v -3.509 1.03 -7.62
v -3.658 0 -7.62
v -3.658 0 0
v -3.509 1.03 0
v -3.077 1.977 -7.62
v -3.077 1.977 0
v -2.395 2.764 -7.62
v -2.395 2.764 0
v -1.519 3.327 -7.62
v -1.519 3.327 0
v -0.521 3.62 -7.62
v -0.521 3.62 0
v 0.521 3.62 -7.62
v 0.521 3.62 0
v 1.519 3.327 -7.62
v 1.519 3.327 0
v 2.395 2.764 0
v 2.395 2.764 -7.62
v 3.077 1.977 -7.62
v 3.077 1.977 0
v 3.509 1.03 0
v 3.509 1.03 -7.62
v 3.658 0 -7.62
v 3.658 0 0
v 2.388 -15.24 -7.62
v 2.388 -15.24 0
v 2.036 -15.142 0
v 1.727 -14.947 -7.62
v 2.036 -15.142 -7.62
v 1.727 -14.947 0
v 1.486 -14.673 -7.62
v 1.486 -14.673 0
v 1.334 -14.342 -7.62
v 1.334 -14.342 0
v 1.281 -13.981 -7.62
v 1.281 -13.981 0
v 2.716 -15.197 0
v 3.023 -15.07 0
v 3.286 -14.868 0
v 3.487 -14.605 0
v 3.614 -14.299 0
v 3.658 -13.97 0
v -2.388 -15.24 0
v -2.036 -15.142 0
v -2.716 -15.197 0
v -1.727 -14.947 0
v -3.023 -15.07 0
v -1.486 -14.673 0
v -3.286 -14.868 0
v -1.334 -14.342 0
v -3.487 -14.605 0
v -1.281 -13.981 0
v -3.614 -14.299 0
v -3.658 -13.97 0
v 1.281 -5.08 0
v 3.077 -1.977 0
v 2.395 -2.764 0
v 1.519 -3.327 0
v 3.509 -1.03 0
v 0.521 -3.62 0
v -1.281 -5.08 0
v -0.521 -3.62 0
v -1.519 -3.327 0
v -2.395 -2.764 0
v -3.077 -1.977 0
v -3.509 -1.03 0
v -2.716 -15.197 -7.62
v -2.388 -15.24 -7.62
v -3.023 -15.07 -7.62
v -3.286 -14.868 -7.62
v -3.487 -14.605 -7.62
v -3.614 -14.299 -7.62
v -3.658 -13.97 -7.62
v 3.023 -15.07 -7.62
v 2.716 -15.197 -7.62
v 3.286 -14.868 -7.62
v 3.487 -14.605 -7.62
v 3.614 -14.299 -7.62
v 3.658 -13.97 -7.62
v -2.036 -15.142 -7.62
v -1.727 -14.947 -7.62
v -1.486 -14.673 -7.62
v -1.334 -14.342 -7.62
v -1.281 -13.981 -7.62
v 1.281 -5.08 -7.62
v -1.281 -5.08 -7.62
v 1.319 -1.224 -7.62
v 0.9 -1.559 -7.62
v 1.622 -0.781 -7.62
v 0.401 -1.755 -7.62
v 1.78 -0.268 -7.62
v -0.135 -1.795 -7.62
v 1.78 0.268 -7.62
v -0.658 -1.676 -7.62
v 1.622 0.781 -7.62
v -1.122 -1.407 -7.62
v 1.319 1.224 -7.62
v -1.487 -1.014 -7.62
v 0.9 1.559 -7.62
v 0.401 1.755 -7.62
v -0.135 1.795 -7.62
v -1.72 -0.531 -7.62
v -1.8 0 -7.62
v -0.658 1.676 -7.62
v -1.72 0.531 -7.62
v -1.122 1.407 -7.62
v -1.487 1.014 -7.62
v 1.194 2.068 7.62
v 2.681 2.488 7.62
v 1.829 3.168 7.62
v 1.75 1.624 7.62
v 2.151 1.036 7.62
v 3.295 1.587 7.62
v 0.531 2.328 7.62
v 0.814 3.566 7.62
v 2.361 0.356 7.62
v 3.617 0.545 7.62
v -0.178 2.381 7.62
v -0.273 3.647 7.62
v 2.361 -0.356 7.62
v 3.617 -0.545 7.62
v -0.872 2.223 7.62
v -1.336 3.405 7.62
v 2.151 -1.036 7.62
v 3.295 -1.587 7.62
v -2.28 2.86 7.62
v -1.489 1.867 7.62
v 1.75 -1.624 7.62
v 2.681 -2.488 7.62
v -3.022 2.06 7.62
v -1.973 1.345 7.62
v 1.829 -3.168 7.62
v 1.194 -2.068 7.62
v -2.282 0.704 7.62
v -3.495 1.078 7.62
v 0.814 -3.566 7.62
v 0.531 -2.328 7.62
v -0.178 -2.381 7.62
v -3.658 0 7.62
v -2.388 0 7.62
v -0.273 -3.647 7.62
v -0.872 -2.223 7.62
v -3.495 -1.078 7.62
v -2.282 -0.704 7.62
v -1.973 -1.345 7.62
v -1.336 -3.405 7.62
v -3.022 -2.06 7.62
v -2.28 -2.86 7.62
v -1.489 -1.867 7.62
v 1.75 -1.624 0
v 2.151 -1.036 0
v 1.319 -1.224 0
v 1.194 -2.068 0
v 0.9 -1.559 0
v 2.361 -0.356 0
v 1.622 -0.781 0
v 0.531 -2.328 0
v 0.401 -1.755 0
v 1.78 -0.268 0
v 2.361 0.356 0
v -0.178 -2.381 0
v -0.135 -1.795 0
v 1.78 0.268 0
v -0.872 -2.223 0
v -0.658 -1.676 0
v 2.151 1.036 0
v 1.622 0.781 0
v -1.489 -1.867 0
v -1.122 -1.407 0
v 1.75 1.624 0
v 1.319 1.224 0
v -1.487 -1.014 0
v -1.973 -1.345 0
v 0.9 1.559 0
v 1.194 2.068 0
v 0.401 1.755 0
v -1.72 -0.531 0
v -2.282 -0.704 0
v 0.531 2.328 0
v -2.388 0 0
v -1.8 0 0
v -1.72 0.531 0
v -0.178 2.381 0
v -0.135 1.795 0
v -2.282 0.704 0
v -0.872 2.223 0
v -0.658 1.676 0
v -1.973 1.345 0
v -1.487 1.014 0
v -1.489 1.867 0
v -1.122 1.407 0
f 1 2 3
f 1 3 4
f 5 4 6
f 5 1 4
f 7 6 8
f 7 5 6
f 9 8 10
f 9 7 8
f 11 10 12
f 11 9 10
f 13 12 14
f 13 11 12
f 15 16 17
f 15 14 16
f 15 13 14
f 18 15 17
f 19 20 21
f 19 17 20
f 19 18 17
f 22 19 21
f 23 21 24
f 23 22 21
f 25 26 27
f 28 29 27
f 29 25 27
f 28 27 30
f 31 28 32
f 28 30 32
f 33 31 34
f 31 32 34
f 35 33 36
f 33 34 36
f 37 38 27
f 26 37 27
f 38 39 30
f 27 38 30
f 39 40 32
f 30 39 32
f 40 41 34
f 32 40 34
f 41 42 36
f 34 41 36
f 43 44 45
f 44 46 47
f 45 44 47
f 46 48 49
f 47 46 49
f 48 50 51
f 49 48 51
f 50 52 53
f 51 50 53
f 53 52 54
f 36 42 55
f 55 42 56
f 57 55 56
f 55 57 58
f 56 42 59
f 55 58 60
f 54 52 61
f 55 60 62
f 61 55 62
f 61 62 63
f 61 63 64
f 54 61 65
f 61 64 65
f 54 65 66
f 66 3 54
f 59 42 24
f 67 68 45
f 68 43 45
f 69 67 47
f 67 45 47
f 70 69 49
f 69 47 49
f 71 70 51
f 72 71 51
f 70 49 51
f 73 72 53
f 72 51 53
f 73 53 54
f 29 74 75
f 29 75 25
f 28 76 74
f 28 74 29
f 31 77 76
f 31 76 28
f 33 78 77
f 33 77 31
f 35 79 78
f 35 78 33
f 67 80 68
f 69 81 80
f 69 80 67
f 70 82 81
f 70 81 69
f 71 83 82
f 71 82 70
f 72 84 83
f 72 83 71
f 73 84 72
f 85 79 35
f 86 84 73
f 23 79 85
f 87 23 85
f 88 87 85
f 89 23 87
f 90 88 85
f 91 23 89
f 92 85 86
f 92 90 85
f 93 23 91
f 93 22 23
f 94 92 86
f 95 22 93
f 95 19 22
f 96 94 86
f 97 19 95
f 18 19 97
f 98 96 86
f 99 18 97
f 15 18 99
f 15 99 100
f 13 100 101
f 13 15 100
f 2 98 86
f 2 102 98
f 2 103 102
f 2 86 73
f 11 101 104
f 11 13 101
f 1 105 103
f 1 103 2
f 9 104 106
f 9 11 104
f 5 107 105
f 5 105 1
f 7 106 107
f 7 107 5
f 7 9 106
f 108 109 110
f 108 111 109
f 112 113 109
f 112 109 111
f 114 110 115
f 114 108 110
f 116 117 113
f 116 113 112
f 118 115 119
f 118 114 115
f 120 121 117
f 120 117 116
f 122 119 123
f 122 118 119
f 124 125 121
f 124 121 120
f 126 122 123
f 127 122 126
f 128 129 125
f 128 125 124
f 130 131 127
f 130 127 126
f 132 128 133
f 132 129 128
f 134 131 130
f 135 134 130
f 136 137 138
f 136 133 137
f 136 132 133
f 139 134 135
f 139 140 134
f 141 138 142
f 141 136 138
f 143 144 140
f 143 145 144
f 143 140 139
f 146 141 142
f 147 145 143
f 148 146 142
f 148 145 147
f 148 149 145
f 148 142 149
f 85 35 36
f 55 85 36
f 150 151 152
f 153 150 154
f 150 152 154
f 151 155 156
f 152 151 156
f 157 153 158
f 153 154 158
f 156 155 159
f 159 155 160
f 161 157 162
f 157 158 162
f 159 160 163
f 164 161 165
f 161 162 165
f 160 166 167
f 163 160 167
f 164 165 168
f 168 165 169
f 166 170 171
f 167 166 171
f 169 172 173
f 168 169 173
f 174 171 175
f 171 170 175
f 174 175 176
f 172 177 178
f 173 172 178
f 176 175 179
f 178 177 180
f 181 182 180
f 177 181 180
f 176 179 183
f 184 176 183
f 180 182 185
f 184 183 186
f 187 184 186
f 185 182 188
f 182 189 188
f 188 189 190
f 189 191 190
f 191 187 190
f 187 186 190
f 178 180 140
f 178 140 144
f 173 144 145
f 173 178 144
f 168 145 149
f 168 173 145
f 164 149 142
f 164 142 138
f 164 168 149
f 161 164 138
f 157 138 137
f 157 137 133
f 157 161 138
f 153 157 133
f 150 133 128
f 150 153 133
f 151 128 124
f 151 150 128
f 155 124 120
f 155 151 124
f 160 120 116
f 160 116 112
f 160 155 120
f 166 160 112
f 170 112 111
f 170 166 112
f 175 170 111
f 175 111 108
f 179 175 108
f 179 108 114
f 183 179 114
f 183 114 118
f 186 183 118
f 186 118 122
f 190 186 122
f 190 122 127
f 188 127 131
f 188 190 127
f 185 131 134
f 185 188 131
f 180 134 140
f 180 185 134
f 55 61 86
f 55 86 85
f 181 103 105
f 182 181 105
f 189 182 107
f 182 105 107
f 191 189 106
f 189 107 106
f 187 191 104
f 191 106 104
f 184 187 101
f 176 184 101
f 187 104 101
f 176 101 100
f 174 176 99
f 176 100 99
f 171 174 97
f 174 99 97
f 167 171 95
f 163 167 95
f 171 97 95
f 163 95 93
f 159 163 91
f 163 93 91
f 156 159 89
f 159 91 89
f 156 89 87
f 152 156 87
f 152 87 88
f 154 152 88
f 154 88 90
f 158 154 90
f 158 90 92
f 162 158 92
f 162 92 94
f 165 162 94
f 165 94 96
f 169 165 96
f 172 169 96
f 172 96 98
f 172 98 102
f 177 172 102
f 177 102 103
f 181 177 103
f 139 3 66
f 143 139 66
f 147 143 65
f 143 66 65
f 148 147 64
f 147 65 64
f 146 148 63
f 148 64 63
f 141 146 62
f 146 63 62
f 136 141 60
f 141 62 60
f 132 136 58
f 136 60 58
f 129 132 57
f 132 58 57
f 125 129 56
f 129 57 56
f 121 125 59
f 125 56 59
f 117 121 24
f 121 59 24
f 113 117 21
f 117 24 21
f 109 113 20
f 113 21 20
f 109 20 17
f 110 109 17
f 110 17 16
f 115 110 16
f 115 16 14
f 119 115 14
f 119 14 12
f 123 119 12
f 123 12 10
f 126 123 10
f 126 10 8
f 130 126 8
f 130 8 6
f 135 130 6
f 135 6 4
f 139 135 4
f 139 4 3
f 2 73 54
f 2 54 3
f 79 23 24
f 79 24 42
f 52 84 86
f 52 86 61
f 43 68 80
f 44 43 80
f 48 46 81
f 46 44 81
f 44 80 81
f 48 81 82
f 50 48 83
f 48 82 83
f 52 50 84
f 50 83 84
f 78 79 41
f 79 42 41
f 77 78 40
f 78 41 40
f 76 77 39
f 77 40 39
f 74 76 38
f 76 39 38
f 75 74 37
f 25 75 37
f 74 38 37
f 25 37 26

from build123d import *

# Parameters (mm, degrees)
SKETCH1_R            = 3.6576
SKETCH1_R_2          = 2.3876
BOSS_EXTRUDE1_DEPTH  = 7.62
BOSS_EXTRUDE2_START  = 7.62
BOSS_EXTRUDE2_DEPTH  = 7.62
FILLET1_R            = 1.27
SKETCH5_W            = 2.5622
SKETCH5_H            = 7.62
CUT_EXTRUDE1_DEPTH   = 10.16
FILLET2_R            = 1.27
M3_CLEARANCE_HOLE1_D = 3.6


with BuildPart() as part:
    # Sketch1 → Boss-Extrude1 (new body)
    with BuildSketch(Plane.XY):
        with Locations(Location((0, 0, 0), (0, 0, 180))):
            Circle(SKETCH1_R)
        with Locations(Location((0, 0, 0), (0, 0, 180))):
            Circle(SKETCH1_R_2, mode=Mode.SUBTRACT)
    extrude(amount=BOSS_EXTRUDE1_DEPTH)

    # Sketch4 → Boss-Extrude2 (add)
    with BuildSketch(Plane(origin=(0, 0, 0), x_dir=(-1, 0, 0), z_dir=(0, 0, -1)).offset(BOSS_EXTRUDE2_START)):
        with BuildLine():
            Line((-3.6576, 0), (-3.6576, -15.24))
            Line((-3.6576, -15.24), (3.6576, -15.24))
            Line((3.6576, -15.24), (3.6576, 0))
            ThreePointArc((3.6576, 0), (0, 3.6576), (-3.6576, 0))
        make_face()
    extrude(amount=-BOSS_EXTRUDE2_DEPTH)

    # Fillet1
    fillet1_edges = [part.edges().sort_by_distance(p)[0] for p in [
        (3.6576, -15.24, -3.81),
        (-3.6576, -15.24, -3.81),
    ]]
    fillet(fillet1_edges, radius=FILLET1_R)

    # Sketch5 → Cut-Extrude1 (cut)
    with BuildSketch(Plane.XZ.offset(15.24)):
        with Locations((0, -3.81)):
            Rectangle(SKETCH5_W, SKETCH5_H)
    extrude(amount=-CUT_EXTRUDE1_DEPTH, mode=Mode.SUBTRACT)

    # Fillet2
    # the kernel refuses this fillet: 1.27 mm, written as the material it takes off along each edge
    with BuildSketch(Plane(origin=(1.2811, -15.24, 3.148578796), x_dir=(0, 1, 0), z_dir=(0, 0, -1))) as fillet2_piece_1:
        with BuildLine():
            CenterArc((1.259431519, 1.27), FILLET2_R, 187.396796907, 82.603203093)
            Line((0, 1.1065), (-0.02518863, 1.10323))
            ThreePointArc((-0.02518863, 1.10323), (-0.0254, 0.55325), (-0.0254, 0))
            Line((-0.0254, 0), (0, -0.0254))
            Line((0, -0.0254), (1.259431519, -0.0254))
            Line((1.259431519, -0.0254), (1.259431519, 0))
        make_face()
    extrude(amount=13.917157593, mode=Mode.SUBTRACT)
    with BuildSketch(Plane(origin=(-1.2811, -15.24, -10.768578796), x_dir=(-1, 0, 0), z_dir=(0, 0, 1))) as fillet2_piece_2:
        with BuildLine():
            CenterArc((1.27, -1.259431519), FILLET2_R, 97.396796907, 82.603203093)
            Line((0, -1.259431519), (-0.0254, -1.259431519))
            Line((-0.0254, -1.259431519), (-0.0254, 0))
            Line((-0.0254, 0), (0, 0.0254))
            ThreePointArc((0, 0.0254), (0.55325, 0.0254), (1.10323, 0.02518863))
            Line((1.10323, 0.02518863), (1.1065, 0))
        make_face()
    extrude(amount=13.917157593, mode=Mode.SUBTRACT)

    # M3 Clearance Hole1 (through all)
    with Locations(Plane.XY):
        with Locations((0, 0)):
            Hole(M3_CLEARANCE_HOLE1_D / 2)


solid = part.part
